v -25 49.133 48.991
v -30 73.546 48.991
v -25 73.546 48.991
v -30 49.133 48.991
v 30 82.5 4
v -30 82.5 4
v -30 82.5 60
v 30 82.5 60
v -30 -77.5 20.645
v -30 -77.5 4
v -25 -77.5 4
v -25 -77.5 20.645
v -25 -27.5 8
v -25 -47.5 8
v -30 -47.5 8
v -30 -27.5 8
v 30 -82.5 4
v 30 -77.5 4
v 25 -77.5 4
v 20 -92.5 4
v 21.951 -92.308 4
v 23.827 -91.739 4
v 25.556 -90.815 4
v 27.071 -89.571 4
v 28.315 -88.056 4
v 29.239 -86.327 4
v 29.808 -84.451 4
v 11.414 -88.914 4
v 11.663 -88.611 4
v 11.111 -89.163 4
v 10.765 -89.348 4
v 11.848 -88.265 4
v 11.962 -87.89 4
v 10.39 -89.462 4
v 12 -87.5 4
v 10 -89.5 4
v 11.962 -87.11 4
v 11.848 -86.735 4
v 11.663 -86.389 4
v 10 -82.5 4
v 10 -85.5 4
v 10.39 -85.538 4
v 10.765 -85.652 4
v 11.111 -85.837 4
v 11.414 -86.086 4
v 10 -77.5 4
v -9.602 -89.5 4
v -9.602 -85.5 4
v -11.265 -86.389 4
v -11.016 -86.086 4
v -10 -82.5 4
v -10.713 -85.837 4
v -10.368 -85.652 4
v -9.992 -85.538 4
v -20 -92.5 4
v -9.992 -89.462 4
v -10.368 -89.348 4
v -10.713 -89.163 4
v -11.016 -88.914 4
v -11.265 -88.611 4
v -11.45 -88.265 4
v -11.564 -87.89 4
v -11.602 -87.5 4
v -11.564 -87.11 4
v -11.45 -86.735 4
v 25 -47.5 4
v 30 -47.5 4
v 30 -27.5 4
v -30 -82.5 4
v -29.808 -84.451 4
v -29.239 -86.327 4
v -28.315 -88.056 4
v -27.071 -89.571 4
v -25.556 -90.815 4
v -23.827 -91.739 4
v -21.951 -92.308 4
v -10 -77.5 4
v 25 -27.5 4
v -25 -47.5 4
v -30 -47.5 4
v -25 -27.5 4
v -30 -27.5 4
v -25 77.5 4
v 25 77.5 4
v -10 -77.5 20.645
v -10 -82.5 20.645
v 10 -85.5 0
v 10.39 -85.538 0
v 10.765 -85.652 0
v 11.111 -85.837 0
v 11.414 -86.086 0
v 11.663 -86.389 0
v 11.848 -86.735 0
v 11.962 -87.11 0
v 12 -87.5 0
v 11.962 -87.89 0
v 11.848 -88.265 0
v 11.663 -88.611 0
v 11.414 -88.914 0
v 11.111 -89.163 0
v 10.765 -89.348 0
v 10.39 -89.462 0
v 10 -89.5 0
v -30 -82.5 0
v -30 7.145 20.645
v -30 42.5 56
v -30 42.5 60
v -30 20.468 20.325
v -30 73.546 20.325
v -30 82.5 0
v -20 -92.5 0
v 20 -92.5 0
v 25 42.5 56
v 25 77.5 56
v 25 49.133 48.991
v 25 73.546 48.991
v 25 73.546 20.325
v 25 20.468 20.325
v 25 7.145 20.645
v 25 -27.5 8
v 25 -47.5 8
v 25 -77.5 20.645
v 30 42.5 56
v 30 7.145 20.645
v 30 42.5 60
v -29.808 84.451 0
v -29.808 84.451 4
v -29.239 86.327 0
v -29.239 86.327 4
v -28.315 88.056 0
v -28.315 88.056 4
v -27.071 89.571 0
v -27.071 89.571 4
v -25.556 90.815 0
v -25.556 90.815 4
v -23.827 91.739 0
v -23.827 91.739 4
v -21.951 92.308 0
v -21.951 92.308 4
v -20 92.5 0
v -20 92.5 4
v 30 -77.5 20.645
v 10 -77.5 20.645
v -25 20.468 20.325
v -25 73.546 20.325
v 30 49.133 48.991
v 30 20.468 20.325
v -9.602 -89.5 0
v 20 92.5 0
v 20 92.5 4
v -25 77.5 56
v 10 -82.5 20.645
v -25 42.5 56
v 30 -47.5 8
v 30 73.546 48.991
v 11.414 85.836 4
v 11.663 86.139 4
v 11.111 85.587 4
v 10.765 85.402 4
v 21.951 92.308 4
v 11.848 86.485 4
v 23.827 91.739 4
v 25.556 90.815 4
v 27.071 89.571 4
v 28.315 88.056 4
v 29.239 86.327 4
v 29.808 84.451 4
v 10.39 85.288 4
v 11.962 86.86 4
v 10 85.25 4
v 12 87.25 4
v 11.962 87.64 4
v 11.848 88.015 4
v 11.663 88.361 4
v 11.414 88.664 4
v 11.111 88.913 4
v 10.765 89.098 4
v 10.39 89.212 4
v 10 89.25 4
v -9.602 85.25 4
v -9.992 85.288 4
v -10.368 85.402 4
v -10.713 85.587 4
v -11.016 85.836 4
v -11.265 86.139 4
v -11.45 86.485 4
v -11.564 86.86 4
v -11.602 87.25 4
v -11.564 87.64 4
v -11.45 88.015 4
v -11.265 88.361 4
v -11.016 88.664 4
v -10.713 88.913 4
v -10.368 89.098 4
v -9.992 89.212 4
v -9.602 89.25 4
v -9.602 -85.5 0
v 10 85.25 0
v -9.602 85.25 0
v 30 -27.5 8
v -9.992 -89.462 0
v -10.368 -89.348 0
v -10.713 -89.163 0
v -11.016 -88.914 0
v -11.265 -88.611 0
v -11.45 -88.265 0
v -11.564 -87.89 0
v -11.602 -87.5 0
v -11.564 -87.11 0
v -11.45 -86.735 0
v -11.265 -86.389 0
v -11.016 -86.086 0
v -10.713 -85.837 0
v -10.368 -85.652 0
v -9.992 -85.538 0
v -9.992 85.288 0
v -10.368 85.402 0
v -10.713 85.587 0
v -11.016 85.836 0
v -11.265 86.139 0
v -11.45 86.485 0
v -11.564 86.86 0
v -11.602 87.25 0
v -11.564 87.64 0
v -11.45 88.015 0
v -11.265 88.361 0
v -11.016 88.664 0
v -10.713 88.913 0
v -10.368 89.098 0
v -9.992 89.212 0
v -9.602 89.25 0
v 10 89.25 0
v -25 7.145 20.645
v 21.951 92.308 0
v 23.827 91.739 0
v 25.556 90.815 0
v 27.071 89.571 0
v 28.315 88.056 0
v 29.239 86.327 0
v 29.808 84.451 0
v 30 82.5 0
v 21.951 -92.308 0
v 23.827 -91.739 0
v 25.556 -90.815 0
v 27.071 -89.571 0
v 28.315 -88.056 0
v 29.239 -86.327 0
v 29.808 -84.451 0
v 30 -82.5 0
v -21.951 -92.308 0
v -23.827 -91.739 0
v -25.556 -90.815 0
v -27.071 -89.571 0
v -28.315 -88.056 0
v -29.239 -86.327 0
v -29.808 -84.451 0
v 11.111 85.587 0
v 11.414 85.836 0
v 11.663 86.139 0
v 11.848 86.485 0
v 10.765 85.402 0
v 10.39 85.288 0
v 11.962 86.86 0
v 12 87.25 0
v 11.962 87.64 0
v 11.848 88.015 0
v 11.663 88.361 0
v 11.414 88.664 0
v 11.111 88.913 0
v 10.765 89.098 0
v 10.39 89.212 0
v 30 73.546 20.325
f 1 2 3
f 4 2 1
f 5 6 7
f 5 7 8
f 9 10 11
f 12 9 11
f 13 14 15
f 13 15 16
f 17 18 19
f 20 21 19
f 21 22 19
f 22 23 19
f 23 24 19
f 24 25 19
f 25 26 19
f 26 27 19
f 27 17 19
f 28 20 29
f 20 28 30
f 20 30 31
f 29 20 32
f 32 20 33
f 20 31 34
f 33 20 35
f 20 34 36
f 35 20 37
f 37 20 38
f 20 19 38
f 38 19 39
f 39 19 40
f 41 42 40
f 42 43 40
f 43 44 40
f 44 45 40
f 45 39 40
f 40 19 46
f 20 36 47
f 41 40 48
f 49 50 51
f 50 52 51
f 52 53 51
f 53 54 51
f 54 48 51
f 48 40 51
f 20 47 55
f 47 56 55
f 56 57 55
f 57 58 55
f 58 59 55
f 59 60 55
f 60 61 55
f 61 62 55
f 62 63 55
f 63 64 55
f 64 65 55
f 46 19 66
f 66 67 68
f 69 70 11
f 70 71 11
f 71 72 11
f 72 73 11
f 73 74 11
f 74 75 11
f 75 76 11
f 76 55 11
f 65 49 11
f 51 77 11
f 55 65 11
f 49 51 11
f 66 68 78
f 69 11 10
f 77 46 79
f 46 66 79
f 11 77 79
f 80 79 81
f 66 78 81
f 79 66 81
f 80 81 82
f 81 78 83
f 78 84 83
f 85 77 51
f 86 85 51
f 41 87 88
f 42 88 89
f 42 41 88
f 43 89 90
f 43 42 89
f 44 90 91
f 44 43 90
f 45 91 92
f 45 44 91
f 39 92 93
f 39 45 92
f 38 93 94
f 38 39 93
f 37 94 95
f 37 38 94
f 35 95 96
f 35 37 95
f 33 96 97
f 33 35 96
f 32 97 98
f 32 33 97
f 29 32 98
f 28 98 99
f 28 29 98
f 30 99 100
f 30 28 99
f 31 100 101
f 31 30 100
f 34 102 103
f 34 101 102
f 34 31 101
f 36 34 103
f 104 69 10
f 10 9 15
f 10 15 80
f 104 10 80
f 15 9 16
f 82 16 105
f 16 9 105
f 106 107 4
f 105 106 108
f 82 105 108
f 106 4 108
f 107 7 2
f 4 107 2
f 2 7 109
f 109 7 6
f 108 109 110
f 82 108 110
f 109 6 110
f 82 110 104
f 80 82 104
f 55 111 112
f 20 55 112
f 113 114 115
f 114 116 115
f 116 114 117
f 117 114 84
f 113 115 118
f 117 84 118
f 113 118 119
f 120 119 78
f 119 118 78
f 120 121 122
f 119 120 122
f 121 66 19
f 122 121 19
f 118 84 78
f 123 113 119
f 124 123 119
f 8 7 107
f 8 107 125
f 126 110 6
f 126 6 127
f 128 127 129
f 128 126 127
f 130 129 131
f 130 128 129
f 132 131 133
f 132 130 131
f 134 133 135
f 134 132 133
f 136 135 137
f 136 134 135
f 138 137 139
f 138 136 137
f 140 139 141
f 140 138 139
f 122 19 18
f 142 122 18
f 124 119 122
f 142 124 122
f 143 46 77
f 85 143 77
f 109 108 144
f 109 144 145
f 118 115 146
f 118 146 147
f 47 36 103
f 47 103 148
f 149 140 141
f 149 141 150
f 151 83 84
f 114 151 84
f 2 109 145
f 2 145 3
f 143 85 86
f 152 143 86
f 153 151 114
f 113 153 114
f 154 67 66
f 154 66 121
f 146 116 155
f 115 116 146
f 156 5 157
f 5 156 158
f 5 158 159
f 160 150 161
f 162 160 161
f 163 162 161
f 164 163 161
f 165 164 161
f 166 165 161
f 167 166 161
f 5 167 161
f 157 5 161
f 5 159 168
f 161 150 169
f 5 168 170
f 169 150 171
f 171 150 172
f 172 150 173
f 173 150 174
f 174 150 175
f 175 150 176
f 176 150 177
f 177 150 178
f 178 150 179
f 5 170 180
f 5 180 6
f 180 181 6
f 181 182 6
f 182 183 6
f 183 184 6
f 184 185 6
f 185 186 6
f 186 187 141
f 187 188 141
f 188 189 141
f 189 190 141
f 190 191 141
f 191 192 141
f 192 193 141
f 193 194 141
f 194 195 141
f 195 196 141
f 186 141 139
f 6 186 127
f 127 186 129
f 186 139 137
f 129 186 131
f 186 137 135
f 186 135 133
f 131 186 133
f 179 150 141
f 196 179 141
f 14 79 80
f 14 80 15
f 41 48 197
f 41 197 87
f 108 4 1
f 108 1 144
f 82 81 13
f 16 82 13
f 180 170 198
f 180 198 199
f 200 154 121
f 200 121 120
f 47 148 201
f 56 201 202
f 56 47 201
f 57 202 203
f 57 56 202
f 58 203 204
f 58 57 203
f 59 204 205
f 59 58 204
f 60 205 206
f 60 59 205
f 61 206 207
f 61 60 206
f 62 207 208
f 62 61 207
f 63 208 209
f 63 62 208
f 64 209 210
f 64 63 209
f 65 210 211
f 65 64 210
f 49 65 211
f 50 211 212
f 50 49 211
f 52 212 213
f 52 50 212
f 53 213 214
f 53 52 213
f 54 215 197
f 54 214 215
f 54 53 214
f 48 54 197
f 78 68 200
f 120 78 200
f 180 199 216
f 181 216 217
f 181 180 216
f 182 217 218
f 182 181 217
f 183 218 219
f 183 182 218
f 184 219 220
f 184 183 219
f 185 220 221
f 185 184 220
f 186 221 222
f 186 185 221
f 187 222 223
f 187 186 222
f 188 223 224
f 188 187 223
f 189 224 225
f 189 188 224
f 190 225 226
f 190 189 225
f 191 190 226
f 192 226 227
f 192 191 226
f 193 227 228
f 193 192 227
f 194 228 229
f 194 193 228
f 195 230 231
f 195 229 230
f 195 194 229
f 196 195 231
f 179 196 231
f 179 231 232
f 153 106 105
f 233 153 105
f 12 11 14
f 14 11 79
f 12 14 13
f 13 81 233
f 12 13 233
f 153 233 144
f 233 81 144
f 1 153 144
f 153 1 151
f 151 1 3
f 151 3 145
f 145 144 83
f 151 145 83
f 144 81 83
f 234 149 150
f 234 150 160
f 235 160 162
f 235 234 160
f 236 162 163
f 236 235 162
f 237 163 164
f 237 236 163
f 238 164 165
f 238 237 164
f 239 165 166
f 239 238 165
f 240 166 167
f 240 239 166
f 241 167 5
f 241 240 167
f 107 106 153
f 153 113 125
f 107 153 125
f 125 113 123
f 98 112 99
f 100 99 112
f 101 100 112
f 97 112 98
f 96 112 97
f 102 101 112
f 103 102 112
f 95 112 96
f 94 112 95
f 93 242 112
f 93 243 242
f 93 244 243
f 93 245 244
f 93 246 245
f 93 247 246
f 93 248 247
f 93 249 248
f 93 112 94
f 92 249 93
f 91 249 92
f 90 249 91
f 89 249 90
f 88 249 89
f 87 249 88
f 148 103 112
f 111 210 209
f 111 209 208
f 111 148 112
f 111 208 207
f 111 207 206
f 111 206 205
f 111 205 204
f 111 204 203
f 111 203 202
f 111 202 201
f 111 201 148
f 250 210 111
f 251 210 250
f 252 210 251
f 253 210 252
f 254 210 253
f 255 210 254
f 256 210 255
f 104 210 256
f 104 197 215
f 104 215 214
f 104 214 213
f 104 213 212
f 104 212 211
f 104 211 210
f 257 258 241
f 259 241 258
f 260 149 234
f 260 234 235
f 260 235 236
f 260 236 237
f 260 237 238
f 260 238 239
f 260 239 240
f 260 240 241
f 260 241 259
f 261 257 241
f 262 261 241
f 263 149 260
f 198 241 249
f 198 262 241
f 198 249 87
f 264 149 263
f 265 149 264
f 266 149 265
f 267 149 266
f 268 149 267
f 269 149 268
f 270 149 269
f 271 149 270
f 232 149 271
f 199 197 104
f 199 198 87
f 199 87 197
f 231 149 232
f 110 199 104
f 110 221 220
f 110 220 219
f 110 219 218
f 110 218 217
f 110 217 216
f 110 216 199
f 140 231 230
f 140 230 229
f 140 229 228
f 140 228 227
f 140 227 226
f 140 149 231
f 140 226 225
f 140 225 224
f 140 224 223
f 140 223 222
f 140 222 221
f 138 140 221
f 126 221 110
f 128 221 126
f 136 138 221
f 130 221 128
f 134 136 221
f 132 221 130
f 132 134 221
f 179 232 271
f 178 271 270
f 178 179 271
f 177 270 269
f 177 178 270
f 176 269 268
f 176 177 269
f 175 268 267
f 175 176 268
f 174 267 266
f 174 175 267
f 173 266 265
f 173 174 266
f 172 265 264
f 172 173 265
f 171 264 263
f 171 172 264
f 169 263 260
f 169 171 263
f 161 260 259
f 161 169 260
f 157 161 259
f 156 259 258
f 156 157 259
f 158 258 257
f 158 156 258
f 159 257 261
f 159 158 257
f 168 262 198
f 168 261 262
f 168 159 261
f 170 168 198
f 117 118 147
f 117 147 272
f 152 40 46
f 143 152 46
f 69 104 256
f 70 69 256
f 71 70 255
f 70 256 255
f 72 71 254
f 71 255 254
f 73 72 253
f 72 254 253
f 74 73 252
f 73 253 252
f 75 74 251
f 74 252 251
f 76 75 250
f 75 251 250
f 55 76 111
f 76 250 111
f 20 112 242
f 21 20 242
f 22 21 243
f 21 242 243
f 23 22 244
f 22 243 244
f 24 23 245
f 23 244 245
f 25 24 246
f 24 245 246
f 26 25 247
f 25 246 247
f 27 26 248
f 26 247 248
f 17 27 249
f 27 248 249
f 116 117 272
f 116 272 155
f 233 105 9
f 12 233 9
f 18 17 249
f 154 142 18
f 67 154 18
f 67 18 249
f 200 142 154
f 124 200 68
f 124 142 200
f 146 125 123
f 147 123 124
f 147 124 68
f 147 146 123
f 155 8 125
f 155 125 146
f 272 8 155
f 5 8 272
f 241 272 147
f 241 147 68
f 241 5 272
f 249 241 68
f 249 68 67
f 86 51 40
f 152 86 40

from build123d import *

# Parameters (mm, degrees)
SALIENTE_EXTRUIR2_DEPTH    = 4
SALIENTE_EXTRUIR3_DEPTH    = 52
CROQUIS3_W                 = 60
CROQUIS3_H                 = 4
SALIENTE_EXTRUIR4_DEPTH    = 40
CORTAR_EXTRUIR1_DEPTH      = 87
CORTAR_EXTRUIR2_DEPTH      = 87
CORTAR_EXTRUIR2_DEPTH_BACK = 87
CROQUIS6_W                 = 4
CROQUIS6_H                 = 20
CORTAR_EXTRUIR3_DEPTH      = 87
CORTAR_EXTRUIR4_DEPTH      = 87


with BuildPart() as part:
    # Croquis1 → Saliente-Extruir2 (new body)
    with BuildSketch(Plane.XY):
        with BuildLine():
            ThreePointArc((-30, 82.5), (-27.071067812, 89.571067812), (-20, 92.5))
            Line((-20, 92.5), (20, 92.5))
            ThreePointArc((20, 92.5), (27.071067812, 89.571067812), (30, 82.5))
            Line((30, 82.5), (-30, 82.5))
        make_face()
        Polygon((25, 77.5), (25, -77.5), (30, -77.5), (30, 82.5), (-30, 82.5), (-30, -77.5), (-25, -77.5), (-25, 77.5), align=None)
        Polygon((-10, -77.5), (0, -77.5), (10, -77.5), (25, -77.5), (25, 77.5), (-25, 77.5), (-25, -77.5), align=None)
        with BuildLine():
            Line((25, -77.5), (10, -77.5))
            Line((10, -77.5), (10, -82.5))
            Line((10, -82.5), (-10, -82.5))
            Line((-10, -82.5), (-10, -77.5))
            Line((-10, -77.5), (-25, -77.5))
            Line((-25, -77.5), (-30, -77.5))
            Line((-30, -77.5), (-30, -82.5))
            ThreePointArc((-30, -82.5), (-27.071067812, -89.571067812), (-20, -92.5))
            Line((-20, -92.5), (20, -92.5))
            ThreePointArc((20, -92.5), (27.071067812, -89.571067812), (30, -82.5))
            Line((30, -82.5), (30, -77.5))
            Line((30, -77.5), (25, -77.5))
        make_face()
        Polygon((10, -77.5), (0, -77.5), (-10, -77.5), (-10, -82.5), (10, -82.5), align=None)
    extrude(amount=SALIENTE_EXTRUIR2_DEPTH)

    # Croquis2 → Saliente-Extruir3 (add)
    with BuildSketch(Plane.XY.offset(4)):
        Polygon((10, -77.5), (0, -77.5), (-10, -77.5), (-10, -82.5), (10, -82.5), align=None)
        Polygon((25, 77.5), (25, -77.5), (30, -77.5), (30, 82.5), (-30, 82.5), (-30, -77.5), (-25, -77.5), (-25, 77.5), align=None)
    extrude(amount=SALIENTE_EXTRUIR3_DEPTH)

    # Croquis3 → Saliente-Extruir4 (add)
    with BuildSketch(Plane(origin=(0, 82.5, 0), x_dir=(1, 0, 0), z_dir=(0, 1, 0))):
        with Locations((0, -58)):
            Rectangle(CROQUIS3_W, CROQUIS3_H)
    extrude(amount=-SALIENTE_EXTRUIR4_DEPTH)

    # Croquis4 → Cortar-Extruir1 (cut)
    with BuildSketch(Plane.ZY.offset(30)):
        Polygon((56, 42.5), (20.644660941, 7.144660941), (20.644660941, -100.088523904), (56, -100.088523904), align=None)
    extrude(amount=-CORTAR_EXTRUIR1_DEPTH, mode=Mode.SUBTRACT)

    # Croquis6 → Cortar-Extruir2 (cut, two sides: drawn at the far end of the back side and taken through both)
    with BuildSketch(Plane.ZY.offset(-25).offset(-CORTAR_EXTRUIR2_DEPTH_BACK)):
        with Locations((6, -37.5)):
            Rectangle(CROQUIS6_W, CROQUIS6_H)
    extrude(amount=CORTAR_EXTRUIR2_DEPTH + CORTAR_EXTRUIR2_DEPTH_BACK, mode=Mode.SUBTRACT)

    # Croquis7 → Cortar-Extruir3 (cut)
    with BuildSketch(Plane.ZY.offset(30)):
        Polygon((20.325435978, 20.468039644), (20.325435978, 73.545906874), (48.990760507, 73.545906874), (48.990760507, 49.133364172), align=None)
    extrude(amount=-CORTAR_EXTRUIR3_DEPTH, mode=Mode.SUBTRACT)

    # Croquis8 → Cortar-Extruir4 (cut)
    with BuildSketch(Plane.XY.offset(4)):
        with BuildLine():
            Line((-9.602247867, -85.5), (10, -85.5))
            ThreePointArc((10, -85.5), (12, -87.5), (10, -89.5))
            Line((10, -89.5), (-9.602247867, -89.5))
            ThreePointArc((-9.602247867, -89.5), (-11.602247867, -87.5), (-9.602247867, -85.5))
        make_face()
        with BuildLine():
            Line((10, 85.25), (-9.602247867, 85.25))
            ThreePointArc((-9.602247867, 85.25), (-11.602247867, 87.25), (-9.602247867, 89.25))
            Line((-9.602247867, 89.25), (10, 89.25))
            ThreePointArc((10, 89.25), (12, 87.25), (10, 85.25))
        make_face()
    extrude(amount=-CORTAR_EXTRUIR4_DEPTH, mode=Mode.SUBTRACT)


solid = part.part
